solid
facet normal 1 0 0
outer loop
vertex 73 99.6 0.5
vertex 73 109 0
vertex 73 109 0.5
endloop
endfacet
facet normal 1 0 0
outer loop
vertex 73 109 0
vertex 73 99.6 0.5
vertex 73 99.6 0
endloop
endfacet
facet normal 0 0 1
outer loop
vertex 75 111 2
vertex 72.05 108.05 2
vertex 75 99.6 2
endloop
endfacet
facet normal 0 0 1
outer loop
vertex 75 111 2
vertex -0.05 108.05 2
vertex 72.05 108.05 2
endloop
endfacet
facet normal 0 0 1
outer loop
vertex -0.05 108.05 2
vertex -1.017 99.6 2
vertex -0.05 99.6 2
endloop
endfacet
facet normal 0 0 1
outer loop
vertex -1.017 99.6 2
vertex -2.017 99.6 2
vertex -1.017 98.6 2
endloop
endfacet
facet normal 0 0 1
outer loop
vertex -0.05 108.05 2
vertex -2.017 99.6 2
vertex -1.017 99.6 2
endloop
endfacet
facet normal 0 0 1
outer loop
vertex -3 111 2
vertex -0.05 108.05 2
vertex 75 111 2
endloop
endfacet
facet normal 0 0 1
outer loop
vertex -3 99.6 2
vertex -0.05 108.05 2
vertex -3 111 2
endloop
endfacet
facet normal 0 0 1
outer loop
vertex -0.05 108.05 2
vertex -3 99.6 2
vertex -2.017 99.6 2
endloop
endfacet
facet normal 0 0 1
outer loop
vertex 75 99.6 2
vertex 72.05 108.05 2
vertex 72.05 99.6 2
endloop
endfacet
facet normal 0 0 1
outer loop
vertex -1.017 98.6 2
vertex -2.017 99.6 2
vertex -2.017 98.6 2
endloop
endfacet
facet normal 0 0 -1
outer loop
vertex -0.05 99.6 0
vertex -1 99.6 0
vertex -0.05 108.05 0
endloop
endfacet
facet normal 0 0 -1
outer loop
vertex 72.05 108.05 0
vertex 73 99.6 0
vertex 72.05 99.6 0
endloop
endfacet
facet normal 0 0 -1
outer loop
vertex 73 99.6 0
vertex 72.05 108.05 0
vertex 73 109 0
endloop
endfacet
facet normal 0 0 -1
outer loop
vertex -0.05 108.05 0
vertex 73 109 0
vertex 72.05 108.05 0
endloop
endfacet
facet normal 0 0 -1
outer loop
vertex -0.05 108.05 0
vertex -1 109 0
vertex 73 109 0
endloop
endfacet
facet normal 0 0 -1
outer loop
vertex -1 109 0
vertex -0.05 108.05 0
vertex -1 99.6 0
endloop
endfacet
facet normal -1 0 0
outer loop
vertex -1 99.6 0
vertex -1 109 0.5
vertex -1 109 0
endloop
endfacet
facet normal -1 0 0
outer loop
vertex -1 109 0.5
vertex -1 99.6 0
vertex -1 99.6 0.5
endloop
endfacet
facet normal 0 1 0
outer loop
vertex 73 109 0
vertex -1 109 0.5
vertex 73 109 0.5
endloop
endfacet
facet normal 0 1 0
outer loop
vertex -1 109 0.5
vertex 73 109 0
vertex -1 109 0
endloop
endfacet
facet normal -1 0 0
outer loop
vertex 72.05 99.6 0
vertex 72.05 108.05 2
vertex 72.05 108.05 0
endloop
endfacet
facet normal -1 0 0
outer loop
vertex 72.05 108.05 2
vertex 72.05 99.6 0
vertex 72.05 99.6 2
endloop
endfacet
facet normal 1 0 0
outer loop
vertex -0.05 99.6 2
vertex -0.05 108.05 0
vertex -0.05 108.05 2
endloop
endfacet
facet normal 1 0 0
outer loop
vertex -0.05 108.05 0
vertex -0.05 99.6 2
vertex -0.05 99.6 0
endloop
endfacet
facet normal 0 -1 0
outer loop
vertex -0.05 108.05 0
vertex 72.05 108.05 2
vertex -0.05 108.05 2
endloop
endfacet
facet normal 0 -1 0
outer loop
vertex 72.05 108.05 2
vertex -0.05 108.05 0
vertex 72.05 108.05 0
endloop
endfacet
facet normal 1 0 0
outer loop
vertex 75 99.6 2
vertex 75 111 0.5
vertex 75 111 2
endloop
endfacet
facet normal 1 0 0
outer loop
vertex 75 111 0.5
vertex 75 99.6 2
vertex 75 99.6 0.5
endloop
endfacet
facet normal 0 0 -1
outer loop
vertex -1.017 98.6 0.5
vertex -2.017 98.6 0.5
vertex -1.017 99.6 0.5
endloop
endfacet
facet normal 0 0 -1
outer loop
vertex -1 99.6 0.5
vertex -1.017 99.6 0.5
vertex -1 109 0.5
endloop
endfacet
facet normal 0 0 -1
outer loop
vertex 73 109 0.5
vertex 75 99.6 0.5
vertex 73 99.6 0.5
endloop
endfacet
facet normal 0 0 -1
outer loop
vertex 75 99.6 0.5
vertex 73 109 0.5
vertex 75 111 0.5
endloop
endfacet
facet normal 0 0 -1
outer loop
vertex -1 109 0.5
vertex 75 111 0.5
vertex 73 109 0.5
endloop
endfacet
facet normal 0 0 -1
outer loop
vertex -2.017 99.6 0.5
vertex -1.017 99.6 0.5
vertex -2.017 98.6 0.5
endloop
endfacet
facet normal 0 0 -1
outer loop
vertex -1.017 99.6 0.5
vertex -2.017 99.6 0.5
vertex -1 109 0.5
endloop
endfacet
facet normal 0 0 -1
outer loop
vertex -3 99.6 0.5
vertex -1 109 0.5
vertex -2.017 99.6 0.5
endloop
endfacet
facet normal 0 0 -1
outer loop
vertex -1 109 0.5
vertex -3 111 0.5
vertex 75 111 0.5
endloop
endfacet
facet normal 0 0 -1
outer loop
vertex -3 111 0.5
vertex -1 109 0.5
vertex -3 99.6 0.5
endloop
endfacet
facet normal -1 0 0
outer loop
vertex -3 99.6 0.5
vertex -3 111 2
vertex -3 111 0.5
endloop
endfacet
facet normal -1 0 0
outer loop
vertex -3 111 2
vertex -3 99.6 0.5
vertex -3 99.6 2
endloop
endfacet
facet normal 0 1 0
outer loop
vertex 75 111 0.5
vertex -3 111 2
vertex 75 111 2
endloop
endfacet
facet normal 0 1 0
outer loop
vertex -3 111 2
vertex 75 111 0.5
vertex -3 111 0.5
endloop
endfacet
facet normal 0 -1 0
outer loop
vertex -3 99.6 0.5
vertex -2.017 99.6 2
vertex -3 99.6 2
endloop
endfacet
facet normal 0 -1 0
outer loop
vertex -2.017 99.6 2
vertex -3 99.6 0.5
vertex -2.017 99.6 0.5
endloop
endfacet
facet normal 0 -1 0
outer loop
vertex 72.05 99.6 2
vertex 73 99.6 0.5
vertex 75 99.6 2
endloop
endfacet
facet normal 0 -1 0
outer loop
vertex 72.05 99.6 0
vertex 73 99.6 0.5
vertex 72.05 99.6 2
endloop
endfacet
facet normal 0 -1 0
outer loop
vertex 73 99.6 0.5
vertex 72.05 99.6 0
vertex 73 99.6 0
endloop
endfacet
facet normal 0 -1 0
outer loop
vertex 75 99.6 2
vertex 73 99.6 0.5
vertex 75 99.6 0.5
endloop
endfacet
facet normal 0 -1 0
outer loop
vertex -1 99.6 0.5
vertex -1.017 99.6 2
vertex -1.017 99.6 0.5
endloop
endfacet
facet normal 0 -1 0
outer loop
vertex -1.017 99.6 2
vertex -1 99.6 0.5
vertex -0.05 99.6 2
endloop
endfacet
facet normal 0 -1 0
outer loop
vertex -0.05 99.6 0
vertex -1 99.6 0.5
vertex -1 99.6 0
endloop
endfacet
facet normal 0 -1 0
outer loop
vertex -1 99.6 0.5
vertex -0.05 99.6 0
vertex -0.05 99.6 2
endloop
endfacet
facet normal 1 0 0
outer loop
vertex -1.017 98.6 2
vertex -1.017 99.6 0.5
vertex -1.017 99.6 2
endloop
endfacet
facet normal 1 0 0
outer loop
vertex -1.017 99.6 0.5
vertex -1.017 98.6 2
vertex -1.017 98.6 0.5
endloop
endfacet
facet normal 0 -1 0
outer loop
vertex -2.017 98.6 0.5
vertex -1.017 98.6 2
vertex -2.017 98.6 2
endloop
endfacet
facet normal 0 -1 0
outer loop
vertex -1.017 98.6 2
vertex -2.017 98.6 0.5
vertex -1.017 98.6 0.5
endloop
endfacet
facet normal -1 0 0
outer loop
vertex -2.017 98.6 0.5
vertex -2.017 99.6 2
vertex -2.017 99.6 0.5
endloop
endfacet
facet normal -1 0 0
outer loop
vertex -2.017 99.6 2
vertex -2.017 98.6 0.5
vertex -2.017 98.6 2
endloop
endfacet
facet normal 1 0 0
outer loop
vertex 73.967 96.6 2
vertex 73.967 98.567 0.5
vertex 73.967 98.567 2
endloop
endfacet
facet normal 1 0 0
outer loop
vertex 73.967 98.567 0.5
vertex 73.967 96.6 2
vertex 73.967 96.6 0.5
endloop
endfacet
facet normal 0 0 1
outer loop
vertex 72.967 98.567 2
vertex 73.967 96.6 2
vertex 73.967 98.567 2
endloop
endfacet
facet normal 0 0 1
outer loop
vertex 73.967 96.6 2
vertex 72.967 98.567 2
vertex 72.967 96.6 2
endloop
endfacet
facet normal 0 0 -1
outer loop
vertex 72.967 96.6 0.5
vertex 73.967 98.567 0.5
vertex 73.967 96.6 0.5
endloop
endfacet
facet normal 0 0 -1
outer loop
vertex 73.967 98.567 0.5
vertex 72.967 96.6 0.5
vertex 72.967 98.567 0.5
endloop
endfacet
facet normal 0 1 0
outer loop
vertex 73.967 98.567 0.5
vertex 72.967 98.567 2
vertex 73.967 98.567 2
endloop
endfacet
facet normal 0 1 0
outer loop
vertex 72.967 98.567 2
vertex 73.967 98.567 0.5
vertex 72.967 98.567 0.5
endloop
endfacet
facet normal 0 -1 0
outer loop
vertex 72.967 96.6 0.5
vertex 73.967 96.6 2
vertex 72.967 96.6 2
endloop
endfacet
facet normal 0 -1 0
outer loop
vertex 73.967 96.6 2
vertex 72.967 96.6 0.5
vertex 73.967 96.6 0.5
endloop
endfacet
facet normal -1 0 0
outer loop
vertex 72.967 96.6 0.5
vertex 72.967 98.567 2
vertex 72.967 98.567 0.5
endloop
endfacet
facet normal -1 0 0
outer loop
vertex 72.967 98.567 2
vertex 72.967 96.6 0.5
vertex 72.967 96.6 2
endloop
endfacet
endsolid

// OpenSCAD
// Generated by SolidPython 1.0.2 on 2020-11-24 23:05:08


union() {
	union() {
		difference() {
			union() {
				difference() {
					translate(v = [-1.0000000000, -1.0000000000, 0]) {
						cube(size = [74.0000000000, 110.0000000000, 2]);
					}
					translate(v = [-0.0500000000, -0.0500000000, 0]) {
						cube(size = [72.1000000000, 108.1000000000, 2]);
					}
				}
				translate(v = [0, 0, 0.5000000000]) {
					difference() {
						translate(v = [-3.0000000000, -3.0000000000, 0]) {
							cube(size = [78.0000000000, 114.0000000000, 1.5000000000]);
						}
						translate(v = [-1.0000000000, -1.0000000000, 0]) {
							cube(size = [74.0000000000, 110.0000000000, 1.5000000000]);
						}
					}
				}
			}
			translate(v = [-3.0000000000, -3.0000000000, 0]) {
				cube(size = [78.0000000000, 102.6000000000, 2]);
			}
		}
		translate(v = [-2.0166666667, 98.6000000000, 0]) {
			translate(v = [0, 0, 0.5000000000]) {
				union() {
					translate(v = [0.0166666667, 0, 0]) {
						cube(size = [0.9833333333, 1.9666666667, 1.5000000000]);
					}
					cube(size = [1, 1.9666666667, 1.5000000000]);
				}
			}
		}
	}
	translate(v = [72.9666666667, 96.6000000000, 0]) {
		translate(v = [0, 0, 0.5000000000]) {
			union() {
				translate(v = [0.0166666667, 0, 0]) {
					cube(size = [0.9833333333, 1.9666666667, 1.5000000000]);
				}
				cube(size = [1, 1.9666666667, 1.5000000000]);
			}
		}
	}
}
